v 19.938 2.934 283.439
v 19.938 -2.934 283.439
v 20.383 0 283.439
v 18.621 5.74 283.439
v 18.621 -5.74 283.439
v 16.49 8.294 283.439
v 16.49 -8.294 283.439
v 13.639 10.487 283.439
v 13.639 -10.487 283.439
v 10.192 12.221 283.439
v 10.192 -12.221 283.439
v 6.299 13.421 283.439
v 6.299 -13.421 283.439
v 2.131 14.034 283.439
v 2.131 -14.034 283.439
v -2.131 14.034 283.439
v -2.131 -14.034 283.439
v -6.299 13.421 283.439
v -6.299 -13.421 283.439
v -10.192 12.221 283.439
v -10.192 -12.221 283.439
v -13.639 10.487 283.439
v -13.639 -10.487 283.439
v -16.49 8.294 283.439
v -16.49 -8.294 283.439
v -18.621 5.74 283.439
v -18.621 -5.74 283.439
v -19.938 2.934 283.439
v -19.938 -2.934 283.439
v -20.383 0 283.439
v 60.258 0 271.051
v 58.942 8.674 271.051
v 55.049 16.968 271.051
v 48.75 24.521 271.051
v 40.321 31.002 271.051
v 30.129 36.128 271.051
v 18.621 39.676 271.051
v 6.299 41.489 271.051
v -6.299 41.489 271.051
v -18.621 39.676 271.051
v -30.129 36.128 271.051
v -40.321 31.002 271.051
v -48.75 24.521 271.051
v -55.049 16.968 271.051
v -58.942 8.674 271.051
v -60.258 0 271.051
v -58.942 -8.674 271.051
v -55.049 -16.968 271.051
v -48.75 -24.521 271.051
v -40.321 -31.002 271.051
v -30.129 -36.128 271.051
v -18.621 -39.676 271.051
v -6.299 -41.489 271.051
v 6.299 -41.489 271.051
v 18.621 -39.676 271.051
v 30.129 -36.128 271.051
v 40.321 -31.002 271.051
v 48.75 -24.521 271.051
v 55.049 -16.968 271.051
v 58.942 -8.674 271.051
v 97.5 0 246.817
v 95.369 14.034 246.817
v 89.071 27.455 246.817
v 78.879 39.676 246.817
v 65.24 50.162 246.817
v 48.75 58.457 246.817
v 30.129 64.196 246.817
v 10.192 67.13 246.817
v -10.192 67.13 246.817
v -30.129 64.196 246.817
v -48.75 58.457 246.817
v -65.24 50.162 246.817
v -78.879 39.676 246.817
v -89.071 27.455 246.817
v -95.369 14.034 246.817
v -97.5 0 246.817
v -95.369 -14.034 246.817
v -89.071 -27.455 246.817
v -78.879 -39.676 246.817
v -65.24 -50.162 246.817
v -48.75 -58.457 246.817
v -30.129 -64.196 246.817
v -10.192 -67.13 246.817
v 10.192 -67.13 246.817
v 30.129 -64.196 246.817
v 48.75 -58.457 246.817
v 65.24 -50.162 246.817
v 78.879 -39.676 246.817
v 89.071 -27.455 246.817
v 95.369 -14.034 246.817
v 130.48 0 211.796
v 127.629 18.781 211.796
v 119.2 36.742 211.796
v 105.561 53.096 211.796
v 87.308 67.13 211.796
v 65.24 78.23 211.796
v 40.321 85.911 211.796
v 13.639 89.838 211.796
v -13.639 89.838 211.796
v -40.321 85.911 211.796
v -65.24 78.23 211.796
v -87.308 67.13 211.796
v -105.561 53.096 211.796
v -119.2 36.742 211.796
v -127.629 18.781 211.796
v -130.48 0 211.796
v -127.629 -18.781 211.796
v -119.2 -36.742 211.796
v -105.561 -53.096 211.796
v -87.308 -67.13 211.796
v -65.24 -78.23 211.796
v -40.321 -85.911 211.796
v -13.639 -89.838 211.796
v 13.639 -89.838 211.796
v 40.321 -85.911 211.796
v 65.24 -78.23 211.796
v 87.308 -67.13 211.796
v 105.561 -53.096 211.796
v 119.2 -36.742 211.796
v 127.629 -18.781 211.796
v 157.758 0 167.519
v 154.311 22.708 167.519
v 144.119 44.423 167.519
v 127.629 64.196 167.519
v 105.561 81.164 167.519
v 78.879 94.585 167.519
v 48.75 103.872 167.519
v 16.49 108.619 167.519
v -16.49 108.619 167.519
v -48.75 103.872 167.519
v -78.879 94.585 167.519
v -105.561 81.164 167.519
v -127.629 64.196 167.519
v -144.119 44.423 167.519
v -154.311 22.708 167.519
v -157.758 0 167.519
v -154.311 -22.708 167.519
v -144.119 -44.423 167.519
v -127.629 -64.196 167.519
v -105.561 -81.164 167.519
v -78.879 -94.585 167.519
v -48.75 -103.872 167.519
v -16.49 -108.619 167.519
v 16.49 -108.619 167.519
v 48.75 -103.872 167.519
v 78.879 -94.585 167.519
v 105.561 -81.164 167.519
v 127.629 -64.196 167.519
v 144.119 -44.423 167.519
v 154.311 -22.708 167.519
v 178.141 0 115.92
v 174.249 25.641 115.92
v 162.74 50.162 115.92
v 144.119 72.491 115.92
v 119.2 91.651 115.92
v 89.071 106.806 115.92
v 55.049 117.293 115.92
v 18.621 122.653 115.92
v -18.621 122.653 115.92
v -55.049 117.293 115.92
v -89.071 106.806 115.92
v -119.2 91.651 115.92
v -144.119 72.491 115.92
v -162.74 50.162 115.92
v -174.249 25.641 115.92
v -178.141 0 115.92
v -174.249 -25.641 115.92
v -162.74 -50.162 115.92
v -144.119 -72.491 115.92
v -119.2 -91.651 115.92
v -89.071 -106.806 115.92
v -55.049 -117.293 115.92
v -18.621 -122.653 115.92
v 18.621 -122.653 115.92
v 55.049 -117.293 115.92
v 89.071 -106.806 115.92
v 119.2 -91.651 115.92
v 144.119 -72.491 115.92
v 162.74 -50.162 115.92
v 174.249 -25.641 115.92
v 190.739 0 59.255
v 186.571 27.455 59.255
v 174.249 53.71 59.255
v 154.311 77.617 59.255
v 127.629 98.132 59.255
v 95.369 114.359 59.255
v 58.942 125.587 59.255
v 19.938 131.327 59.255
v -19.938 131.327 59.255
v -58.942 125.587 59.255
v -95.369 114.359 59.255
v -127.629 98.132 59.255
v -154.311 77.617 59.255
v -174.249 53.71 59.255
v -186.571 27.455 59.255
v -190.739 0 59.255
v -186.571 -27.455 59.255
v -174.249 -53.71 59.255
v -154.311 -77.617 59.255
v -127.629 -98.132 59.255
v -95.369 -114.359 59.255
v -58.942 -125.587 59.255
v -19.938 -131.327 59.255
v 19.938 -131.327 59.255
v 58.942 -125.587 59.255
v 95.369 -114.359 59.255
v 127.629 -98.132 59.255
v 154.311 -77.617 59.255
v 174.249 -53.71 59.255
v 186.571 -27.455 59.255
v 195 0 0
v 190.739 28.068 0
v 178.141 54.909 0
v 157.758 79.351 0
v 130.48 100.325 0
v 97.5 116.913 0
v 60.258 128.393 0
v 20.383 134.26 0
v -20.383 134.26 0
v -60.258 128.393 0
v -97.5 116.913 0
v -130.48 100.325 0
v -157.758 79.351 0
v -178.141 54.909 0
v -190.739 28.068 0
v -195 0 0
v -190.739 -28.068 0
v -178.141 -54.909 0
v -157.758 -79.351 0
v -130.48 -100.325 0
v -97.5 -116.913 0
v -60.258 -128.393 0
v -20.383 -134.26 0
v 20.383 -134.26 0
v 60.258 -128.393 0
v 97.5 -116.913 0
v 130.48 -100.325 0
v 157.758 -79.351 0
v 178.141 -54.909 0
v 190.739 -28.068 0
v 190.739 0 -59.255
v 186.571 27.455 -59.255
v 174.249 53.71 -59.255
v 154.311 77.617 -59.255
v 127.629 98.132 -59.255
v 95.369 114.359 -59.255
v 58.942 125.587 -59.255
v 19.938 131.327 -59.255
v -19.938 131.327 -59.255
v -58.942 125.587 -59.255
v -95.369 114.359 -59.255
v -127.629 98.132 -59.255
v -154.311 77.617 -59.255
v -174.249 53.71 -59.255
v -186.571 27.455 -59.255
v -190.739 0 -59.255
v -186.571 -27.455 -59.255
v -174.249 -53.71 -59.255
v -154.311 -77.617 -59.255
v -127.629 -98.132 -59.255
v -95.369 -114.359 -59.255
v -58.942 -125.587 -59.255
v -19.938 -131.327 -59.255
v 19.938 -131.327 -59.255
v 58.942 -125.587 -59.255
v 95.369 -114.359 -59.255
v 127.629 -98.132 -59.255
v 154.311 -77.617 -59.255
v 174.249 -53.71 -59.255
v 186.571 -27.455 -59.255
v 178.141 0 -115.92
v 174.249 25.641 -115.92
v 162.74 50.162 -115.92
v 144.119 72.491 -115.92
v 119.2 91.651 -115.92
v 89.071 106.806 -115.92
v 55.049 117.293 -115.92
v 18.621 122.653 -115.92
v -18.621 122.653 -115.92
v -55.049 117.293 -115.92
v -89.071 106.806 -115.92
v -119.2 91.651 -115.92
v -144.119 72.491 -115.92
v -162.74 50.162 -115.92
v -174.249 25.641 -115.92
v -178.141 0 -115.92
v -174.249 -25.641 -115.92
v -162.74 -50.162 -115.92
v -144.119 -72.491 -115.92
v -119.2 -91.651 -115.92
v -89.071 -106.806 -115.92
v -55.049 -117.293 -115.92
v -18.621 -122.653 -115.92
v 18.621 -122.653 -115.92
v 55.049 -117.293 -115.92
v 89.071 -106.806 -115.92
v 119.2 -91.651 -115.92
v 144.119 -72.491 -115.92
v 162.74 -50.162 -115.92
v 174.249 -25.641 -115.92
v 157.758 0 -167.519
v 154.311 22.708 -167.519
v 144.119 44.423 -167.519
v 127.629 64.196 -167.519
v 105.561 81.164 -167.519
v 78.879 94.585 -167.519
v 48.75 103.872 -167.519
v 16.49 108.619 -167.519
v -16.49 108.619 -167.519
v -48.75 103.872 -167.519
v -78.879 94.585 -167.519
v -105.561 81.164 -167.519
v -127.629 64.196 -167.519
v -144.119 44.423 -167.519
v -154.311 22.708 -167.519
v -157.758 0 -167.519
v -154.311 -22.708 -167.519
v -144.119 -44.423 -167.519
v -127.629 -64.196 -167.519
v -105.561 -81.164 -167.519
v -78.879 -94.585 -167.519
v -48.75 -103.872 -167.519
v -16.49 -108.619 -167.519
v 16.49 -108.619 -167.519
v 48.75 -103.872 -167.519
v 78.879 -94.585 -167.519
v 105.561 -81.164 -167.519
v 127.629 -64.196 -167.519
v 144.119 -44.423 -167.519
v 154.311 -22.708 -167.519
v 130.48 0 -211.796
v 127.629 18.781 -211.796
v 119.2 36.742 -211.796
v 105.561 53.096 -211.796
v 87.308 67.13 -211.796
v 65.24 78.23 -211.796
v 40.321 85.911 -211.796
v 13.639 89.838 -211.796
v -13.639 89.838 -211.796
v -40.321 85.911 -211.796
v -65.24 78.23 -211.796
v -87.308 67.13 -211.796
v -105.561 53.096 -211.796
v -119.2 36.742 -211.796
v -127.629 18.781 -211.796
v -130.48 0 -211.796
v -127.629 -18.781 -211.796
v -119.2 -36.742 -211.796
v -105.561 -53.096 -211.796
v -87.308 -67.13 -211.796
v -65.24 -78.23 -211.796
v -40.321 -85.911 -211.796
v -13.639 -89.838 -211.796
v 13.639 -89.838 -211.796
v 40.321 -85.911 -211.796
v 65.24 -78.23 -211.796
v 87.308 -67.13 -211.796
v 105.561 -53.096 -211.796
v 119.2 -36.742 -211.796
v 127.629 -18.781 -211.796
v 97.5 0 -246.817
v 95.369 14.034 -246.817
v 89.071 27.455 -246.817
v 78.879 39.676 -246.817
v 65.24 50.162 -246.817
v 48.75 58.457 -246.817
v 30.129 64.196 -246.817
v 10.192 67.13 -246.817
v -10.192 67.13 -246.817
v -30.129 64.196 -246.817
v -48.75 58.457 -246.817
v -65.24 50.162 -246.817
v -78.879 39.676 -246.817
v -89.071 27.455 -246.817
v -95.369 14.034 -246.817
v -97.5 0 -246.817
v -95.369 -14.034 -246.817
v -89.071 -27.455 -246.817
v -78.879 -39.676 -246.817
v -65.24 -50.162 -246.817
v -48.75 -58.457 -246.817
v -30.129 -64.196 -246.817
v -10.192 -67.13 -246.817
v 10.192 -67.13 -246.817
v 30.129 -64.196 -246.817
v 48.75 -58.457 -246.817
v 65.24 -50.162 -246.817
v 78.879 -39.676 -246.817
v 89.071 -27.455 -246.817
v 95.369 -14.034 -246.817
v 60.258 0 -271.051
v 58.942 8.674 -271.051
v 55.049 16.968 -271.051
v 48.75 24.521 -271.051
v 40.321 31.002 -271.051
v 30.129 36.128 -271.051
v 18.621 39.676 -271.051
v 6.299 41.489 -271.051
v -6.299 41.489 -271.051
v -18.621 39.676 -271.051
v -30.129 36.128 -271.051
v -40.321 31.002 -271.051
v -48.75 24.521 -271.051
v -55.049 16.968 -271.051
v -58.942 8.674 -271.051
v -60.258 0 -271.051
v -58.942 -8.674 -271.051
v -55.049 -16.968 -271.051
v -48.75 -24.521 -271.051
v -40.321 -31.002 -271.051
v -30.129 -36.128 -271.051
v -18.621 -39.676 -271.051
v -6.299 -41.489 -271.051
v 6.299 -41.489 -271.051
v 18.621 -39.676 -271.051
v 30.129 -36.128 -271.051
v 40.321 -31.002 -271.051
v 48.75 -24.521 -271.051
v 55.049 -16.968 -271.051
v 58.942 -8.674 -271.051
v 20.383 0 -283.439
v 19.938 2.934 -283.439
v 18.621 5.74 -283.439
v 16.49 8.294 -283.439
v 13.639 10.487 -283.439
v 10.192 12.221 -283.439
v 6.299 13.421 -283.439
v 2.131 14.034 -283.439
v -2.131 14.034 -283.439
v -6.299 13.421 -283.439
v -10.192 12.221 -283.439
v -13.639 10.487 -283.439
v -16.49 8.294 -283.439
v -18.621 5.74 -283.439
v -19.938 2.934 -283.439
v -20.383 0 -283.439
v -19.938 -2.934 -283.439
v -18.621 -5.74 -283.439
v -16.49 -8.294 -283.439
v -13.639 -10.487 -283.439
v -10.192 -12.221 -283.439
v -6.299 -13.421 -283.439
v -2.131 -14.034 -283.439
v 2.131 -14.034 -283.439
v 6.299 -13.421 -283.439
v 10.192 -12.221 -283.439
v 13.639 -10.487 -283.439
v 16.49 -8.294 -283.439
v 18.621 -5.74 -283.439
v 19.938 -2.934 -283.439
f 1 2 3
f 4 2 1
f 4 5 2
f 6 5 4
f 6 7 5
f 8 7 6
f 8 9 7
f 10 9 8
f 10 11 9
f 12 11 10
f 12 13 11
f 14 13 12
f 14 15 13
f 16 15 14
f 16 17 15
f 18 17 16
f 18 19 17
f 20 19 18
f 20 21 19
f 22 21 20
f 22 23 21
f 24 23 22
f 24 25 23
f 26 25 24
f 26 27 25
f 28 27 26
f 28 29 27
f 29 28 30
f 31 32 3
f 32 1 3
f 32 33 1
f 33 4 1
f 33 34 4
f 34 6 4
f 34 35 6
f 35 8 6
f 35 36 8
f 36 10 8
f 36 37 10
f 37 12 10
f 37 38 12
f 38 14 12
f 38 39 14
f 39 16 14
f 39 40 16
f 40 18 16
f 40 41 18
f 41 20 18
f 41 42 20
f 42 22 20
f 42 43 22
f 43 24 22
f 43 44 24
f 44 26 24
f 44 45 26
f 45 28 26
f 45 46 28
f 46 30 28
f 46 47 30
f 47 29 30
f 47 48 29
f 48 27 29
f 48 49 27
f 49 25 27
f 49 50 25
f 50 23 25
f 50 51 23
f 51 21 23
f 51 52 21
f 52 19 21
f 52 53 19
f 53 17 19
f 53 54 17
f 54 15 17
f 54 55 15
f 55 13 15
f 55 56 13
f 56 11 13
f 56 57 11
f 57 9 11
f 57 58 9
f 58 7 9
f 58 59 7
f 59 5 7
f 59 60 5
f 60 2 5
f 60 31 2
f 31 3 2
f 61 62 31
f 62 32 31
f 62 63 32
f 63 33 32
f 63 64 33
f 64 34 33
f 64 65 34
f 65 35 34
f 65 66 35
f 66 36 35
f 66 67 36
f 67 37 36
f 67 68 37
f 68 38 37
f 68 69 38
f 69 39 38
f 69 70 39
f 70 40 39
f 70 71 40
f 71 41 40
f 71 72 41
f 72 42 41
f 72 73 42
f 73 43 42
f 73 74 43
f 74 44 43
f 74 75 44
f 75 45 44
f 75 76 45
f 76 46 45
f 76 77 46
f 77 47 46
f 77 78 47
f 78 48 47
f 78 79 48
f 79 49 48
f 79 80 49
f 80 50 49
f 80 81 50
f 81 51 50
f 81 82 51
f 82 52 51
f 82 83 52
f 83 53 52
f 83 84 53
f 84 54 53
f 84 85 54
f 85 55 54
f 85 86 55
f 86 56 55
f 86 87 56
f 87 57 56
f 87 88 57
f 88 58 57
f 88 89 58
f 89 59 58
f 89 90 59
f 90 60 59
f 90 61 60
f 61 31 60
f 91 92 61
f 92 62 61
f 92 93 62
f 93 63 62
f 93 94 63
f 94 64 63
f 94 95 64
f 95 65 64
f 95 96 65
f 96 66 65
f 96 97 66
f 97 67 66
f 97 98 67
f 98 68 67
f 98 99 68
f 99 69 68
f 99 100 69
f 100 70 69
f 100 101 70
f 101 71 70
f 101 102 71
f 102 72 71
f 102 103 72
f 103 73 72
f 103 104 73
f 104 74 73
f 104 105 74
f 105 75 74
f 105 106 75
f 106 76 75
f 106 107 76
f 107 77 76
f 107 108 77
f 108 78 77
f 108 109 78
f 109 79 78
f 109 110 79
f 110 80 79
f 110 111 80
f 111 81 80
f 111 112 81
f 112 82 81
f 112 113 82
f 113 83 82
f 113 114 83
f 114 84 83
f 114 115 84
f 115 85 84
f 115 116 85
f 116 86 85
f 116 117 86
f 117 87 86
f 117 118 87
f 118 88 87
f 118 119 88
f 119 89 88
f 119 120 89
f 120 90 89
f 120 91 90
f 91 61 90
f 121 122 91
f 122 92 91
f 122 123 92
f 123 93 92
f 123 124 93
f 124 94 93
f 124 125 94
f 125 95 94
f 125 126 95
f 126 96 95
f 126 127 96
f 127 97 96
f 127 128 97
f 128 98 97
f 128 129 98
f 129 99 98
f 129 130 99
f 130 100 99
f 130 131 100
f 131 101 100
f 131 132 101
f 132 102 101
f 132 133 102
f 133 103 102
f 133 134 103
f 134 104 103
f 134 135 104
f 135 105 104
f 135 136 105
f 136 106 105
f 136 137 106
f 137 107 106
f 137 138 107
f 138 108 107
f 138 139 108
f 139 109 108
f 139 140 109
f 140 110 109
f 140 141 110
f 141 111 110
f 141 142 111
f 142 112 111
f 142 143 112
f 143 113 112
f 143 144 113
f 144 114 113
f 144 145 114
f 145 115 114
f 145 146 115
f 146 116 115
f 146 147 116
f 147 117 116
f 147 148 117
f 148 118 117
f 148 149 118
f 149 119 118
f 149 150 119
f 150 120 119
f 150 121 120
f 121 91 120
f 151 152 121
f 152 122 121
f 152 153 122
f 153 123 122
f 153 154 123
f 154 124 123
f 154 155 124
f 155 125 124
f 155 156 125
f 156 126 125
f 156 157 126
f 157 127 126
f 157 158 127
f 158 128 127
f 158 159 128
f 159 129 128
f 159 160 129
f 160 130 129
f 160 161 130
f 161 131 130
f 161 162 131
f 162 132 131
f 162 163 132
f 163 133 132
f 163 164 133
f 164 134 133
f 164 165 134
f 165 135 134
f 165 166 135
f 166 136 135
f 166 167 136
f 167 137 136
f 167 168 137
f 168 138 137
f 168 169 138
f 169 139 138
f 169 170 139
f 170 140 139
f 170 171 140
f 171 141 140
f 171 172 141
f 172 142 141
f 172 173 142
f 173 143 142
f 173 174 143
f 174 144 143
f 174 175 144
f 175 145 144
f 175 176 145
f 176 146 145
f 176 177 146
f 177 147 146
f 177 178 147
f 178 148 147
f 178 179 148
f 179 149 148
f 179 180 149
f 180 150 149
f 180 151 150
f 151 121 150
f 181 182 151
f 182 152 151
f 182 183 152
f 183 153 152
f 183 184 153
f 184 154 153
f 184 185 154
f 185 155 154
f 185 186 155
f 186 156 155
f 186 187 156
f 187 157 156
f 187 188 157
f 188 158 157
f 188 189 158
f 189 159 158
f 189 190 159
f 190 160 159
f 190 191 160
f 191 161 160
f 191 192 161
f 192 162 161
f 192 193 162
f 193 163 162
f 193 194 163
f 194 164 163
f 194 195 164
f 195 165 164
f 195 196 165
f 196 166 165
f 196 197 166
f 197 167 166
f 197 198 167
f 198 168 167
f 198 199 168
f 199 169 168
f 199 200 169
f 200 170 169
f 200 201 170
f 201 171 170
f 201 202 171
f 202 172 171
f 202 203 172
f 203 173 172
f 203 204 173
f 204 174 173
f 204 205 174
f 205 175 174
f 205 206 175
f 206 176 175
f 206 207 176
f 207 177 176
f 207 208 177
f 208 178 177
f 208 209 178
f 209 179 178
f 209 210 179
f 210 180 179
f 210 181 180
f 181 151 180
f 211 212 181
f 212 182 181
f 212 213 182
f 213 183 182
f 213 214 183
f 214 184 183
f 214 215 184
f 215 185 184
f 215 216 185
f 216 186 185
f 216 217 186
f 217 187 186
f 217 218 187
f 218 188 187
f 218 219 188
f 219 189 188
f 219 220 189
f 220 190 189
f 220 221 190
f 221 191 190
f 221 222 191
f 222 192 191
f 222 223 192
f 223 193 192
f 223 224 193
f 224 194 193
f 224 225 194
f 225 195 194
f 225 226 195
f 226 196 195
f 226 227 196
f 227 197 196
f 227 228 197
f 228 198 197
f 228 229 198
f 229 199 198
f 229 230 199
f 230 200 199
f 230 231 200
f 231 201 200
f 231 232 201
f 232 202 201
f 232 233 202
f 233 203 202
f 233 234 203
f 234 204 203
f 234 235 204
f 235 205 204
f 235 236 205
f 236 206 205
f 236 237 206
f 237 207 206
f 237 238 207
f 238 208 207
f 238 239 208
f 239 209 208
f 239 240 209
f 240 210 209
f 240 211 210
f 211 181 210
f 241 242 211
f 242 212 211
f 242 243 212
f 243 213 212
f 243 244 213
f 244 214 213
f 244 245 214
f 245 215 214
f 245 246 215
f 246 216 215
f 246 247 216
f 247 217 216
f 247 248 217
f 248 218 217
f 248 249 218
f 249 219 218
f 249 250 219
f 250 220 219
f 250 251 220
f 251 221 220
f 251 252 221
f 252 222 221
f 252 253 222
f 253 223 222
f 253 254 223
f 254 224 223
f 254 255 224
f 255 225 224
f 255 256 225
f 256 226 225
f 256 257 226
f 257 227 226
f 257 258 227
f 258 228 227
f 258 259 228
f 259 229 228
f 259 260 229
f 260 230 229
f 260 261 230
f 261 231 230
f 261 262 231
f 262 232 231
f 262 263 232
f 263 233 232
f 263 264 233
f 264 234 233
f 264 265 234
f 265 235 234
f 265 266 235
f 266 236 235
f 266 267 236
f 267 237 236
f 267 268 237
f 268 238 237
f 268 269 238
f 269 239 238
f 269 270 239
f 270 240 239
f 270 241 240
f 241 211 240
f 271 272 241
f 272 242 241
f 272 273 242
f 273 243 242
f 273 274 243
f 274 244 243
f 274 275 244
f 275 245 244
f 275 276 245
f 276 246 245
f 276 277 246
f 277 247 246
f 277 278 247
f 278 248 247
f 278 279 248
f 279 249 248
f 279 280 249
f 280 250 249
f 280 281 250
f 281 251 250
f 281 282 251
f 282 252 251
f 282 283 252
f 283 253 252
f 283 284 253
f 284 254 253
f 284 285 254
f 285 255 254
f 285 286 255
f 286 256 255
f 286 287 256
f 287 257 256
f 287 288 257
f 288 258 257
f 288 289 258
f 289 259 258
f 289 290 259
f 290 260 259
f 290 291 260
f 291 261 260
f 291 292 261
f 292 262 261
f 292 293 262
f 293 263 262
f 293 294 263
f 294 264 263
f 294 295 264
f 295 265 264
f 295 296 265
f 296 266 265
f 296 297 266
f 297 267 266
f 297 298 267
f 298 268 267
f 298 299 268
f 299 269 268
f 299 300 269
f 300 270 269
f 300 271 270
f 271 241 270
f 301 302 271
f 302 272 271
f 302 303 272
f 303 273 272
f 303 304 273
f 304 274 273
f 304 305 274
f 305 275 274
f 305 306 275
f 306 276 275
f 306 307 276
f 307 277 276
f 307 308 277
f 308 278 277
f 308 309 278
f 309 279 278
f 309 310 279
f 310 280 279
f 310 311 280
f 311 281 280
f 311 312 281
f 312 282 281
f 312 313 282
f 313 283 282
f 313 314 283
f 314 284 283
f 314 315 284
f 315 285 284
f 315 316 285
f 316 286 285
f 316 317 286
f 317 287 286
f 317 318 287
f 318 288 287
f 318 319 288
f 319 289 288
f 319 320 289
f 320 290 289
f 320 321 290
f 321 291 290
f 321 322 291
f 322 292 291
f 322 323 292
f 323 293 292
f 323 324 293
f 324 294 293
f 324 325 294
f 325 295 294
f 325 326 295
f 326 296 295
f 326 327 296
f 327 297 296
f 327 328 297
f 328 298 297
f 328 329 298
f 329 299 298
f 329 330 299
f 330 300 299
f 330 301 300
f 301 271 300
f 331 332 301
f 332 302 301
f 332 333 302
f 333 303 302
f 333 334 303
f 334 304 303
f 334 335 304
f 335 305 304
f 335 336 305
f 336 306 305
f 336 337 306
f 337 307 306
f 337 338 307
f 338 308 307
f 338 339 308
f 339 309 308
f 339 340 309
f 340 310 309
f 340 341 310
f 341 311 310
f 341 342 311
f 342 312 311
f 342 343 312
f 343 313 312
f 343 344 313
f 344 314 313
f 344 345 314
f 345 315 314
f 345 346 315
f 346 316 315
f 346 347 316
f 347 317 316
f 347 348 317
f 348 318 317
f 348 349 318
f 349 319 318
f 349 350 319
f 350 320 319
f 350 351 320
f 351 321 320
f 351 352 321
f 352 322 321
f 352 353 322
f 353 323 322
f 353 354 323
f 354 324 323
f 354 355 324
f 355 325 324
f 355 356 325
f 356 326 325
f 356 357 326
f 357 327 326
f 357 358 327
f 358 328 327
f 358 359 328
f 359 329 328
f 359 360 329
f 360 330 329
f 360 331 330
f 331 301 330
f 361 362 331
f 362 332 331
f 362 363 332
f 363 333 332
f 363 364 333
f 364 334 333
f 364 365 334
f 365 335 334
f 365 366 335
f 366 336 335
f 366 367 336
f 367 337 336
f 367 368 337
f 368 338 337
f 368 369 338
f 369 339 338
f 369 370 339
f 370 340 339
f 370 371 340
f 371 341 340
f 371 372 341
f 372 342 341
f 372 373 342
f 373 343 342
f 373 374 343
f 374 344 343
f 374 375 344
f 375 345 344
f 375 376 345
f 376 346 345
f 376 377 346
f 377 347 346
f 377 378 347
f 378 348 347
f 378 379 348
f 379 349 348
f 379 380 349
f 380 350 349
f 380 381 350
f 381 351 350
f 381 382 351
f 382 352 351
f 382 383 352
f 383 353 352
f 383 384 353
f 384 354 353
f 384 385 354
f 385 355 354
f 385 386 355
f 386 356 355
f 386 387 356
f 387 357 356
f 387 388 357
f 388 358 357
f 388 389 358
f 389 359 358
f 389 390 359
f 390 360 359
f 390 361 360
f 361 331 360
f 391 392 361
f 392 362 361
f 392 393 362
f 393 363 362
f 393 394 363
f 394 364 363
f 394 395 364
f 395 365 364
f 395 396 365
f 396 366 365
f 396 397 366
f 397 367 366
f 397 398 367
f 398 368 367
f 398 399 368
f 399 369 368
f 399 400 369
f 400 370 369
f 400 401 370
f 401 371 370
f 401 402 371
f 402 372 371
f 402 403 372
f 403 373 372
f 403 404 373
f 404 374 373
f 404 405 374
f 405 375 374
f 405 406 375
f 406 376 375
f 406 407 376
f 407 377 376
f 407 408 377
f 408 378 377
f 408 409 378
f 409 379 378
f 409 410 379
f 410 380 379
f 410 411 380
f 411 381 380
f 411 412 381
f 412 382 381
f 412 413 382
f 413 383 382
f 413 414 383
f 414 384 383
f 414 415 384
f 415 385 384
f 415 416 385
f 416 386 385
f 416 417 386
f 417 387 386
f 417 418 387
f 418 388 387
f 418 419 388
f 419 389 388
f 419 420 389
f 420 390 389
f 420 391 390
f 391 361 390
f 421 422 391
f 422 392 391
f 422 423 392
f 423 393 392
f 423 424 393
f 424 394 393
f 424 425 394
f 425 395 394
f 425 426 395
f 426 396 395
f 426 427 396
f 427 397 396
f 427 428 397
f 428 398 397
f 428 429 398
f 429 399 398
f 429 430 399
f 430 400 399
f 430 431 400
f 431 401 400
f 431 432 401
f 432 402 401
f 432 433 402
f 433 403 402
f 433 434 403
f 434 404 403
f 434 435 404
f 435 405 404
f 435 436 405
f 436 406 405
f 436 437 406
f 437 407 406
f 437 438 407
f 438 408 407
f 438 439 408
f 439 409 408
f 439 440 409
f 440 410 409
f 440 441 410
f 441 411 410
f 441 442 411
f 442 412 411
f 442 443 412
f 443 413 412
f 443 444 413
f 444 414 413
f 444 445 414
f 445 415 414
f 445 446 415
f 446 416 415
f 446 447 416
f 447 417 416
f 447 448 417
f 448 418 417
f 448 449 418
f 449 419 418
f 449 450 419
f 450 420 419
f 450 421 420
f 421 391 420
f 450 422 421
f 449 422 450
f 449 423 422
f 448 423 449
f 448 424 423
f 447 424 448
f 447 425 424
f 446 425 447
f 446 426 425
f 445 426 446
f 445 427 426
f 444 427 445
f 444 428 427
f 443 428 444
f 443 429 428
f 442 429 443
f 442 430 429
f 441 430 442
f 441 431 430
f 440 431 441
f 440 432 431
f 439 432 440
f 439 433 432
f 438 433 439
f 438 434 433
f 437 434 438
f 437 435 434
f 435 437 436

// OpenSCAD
// Generated by SolidPython 1.0.1 on 2020-07-29 00:46:50


scale(v = [13, 9, 19]) {
	sphere(r = 15);
}
/***********************************************
*********      SolidPython code:      **********
************************************************
 
# import packages: SolidPython
from solid import *
from solid.utils import *
from itertools import chain, combinations, permutations


class Resize:

    def __init__(self, scad_file):
        self.scad_file = scad_file
        #self.scad_file = import_scad(scad_file)
        # cone/cylinder param:
        self.r1 = 0
        self.r2 = 0
        self.h = 0
        # rectangular prism param:
        self.w = 0
        self.l = 0
        # ellipse param:
        self.r = 0

    # import OpenScad code (file name corresponds to shape)


    # classify shape + parameters
    def assign(self, param1, param2, param3):
        if self.scad_file == 'cone.scad':
            self.r1 = param1
            self.r2 = param2
            self.h = param3
        elif self.scad_file == 'cylinder.scad':
            self.r1 = param1
            self.r2 = param2
            self.h = param3
        elif self.scad_file == 'rectangularPrism.scad':
            self.h = param1
            self.l = param2
            self.w = param3
        else:
            self.r = param1
            self.h = param2

    # resize parameters
    def iterate(self):
        x = range(3, 20, 2)
        i = 1
        if self.scad_file == 'cone.scad':
            tempList = list(permutations(x, 2))
            for temp in tempList:
                param1 = temp[0]
                param2 = temp[1]
                filepath = 'produced_scad_files/' + 'cone' + str(param1) + '_' + str(param2) + '_' + '.scad'
                scad_render_to_file(cylinder(h=param1, r1=param2, r2=0), filepath)

        elif self.scad_file == 'cylinder.scad':
            tempList = list(permutations(x, 3))
            for temp in tempList:
                param1 = temp[0]
                param2 = temp[1]
                filepath = 'produced_scad_files/' + 'cylinder' + str(param1) + '_' + str(param2) + '_' + '.scad'
                scad_render_to_file(cylinder(h=param1, r1=param2, r2=param2), filepath)

        elif self.scad_file == 'rectangularPrism.scad':
            tempList = list(permutations(x, 3))
            for temp in tempList:
                param1 = temp[0]
                param2 = temp[1]
                param3 = temp[2]
                filepath = 'produced_scad_files/' + 'rectangularPrism' + str(param1) + '_' + str(param2) + '_' + str(
                    param3) + '.scad'
                scad_render_to_file(cube(size=(param1, param2, param3)), filepath)

        elif self.scad_file == 'ellipse.scad':
            tempList = list(permutations(x, 4))
            for temp in tempList:
                param1 = temp[0]
                param2 = temp[1]
                param3 = temp[2]
                param4 = temp[3]
                filepath = 'produced_scad_files/' + 'ellipse' + str(param1) + '_' + str(param2) + '_' + str(param3) + '_' + str(param4) + '.scad'
                scad_render_to_file(scale([param1, param2, param3])(sphere(r=param4)), filepath)

    def render_to_scadfile(self):
        scad_render_to_file(scad, 'example.scad') 
 
************************************************/
